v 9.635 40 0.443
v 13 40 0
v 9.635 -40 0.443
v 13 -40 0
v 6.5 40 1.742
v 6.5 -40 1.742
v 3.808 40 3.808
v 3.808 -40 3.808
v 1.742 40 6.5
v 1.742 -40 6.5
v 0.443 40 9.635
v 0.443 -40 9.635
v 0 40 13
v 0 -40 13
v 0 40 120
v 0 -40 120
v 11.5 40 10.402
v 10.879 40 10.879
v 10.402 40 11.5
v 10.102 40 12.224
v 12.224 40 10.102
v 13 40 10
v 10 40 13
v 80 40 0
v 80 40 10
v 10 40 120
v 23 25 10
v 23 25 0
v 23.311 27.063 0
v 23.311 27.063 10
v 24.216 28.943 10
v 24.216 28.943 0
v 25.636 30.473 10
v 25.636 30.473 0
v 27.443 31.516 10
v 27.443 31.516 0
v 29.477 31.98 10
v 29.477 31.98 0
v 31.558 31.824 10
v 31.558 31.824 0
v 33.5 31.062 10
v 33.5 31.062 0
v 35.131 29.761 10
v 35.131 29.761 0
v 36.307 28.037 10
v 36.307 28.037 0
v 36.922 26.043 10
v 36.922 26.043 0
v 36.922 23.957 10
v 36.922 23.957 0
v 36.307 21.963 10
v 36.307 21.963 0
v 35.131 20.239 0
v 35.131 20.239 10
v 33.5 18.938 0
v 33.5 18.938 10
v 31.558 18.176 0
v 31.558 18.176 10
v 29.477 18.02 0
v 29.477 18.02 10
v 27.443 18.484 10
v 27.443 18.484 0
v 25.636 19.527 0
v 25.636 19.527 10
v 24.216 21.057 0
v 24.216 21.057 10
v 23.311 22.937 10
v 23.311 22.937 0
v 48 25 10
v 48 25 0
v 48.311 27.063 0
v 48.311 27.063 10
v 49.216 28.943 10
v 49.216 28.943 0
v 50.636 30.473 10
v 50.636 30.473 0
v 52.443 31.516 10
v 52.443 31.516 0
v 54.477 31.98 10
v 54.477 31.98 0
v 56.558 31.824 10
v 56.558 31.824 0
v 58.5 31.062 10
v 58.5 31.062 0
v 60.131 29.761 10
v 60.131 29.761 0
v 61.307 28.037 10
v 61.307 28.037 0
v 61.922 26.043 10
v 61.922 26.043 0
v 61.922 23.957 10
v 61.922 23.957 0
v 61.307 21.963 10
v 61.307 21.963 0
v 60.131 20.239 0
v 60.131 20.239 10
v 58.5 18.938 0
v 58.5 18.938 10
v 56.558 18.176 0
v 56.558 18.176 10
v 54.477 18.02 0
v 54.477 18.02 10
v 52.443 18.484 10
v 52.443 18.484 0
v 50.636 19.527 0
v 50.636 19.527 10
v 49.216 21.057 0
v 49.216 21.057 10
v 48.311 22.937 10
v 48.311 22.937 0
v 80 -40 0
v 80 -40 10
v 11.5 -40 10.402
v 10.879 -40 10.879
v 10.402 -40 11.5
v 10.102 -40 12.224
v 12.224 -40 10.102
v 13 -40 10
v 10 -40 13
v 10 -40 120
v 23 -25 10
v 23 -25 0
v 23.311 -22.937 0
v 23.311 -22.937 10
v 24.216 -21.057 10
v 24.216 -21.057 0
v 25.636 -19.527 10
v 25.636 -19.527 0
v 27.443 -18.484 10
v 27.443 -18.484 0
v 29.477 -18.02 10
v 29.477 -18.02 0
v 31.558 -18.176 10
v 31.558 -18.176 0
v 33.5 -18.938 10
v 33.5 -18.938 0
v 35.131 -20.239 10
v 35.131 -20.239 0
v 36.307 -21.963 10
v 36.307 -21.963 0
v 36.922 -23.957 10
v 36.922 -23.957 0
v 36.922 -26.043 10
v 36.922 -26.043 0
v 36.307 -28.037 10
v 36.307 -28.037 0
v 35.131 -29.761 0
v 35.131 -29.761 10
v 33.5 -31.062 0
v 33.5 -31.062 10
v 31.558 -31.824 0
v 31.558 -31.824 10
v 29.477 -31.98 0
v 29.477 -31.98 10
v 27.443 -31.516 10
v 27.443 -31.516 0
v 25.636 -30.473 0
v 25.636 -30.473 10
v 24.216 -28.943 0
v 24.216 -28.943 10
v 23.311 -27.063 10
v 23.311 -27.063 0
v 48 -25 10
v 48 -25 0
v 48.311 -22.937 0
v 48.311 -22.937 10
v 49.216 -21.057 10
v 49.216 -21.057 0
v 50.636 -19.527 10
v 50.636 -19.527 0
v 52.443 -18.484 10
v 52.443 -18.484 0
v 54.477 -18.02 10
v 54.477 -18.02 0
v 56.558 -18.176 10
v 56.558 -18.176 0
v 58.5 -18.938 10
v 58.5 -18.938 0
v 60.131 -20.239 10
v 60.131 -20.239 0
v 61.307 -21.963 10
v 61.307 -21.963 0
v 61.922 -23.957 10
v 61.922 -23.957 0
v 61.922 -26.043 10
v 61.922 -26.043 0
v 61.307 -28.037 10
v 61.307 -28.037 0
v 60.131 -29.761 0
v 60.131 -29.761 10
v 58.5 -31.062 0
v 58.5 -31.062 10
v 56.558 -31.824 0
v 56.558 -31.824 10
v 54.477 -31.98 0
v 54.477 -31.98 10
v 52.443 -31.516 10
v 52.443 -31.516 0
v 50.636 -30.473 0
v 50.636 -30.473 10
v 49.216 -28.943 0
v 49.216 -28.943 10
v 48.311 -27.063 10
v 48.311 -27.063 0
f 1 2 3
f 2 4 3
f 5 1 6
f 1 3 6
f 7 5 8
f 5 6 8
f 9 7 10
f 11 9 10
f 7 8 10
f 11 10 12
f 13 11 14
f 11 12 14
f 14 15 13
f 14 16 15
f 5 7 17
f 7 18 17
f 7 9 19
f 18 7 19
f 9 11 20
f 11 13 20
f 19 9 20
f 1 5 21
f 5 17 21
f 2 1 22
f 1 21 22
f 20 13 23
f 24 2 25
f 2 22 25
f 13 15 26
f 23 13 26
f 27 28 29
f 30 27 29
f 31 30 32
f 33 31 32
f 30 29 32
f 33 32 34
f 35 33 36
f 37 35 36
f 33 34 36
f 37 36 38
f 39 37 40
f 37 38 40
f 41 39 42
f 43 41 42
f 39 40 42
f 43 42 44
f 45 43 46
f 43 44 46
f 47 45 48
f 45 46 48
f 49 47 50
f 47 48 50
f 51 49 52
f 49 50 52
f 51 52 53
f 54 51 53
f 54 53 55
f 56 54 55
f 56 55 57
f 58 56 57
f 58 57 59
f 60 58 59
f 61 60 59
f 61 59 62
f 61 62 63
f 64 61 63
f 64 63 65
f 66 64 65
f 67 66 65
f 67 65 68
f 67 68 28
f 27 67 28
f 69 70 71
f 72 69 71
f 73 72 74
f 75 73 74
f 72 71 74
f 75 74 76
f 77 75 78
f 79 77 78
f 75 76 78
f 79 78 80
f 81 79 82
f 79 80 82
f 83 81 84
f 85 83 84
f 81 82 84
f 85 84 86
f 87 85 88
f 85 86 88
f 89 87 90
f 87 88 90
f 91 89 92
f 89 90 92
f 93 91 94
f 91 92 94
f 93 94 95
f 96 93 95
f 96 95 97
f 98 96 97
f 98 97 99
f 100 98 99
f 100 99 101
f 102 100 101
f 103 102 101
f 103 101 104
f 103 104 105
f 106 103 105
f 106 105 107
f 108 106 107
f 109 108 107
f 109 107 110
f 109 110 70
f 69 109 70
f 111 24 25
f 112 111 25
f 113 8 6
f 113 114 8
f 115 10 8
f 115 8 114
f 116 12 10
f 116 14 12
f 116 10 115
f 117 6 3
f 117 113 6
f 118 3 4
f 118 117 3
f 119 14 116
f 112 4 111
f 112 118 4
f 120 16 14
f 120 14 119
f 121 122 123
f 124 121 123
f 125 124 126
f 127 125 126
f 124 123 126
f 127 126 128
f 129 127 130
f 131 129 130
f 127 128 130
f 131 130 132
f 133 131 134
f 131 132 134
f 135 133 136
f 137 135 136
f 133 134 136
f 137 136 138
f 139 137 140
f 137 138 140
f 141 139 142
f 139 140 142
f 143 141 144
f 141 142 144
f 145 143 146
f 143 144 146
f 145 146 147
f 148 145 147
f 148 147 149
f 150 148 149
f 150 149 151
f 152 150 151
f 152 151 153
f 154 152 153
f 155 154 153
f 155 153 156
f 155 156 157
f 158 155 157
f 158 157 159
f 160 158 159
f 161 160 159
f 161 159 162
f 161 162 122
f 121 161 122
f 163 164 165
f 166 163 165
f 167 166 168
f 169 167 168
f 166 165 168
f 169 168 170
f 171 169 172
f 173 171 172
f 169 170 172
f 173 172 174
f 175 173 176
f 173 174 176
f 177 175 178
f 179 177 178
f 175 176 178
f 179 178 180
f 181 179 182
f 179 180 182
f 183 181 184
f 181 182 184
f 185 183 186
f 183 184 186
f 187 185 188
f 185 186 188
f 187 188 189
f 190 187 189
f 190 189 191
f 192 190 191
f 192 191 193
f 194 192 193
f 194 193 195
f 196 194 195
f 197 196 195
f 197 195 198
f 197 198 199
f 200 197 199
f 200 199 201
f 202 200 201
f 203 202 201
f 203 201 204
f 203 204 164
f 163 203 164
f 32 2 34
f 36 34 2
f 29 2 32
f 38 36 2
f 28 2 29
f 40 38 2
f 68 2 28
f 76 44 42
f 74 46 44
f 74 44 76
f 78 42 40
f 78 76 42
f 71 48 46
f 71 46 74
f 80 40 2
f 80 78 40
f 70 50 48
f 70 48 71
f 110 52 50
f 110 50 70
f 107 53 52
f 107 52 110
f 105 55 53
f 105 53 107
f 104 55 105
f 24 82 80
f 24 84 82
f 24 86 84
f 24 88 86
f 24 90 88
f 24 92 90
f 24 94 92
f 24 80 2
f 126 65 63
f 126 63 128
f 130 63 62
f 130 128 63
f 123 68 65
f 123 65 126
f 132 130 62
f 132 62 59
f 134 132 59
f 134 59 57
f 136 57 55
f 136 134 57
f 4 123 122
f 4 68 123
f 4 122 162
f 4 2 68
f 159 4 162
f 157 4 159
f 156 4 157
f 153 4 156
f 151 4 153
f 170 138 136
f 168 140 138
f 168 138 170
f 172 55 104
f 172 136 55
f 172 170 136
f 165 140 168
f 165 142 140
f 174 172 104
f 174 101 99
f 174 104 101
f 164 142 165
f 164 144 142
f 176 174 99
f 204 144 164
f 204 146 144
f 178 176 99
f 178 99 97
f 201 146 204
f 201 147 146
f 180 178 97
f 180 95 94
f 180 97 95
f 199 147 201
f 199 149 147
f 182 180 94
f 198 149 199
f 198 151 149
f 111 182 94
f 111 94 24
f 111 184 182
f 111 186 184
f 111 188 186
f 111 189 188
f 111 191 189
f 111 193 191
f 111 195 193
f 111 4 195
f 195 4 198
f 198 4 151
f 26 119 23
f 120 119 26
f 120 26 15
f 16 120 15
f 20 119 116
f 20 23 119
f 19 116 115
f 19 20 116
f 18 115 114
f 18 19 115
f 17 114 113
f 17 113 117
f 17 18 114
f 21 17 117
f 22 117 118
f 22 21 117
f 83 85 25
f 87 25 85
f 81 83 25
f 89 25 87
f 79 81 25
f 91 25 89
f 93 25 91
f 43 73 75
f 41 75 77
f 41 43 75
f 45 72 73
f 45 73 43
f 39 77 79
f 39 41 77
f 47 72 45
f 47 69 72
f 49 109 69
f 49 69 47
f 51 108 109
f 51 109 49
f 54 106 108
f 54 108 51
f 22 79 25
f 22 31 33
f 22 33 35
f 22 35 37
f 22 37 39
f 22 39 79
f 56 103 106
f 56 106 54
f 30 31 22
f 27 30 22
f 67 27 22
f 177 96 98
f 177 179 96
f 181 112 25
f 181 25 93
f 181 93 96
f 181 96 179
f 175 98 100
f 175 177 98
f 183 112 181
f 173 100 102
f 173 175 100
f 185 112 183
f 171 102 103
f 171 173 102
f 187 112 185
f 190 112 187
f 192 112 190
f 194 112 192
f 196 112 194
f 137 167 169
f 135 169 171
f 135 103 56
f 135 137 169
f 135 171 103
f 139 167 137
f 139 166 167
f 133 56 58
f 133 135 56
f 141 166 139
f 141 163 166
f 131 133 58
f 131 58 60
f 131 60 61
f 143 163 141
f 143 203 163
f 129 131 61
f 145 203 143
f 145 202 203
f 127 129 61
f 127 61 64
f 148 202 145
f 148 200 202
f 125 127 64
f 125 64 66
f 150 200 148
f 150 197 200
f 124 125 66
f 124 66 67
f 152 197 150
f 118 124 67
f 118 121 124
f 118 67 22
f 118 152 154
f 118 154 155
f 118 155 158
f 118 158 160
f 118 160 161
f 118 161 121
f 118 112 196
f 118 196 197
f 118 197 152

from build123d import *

# Parameters (mm, degrees)
F1_DEPTH = 40
F2_R     = 3
F3_R     = 13
F5_D     = 14


with BuildPart() as f1:
    # F0 (on Front) → F1 (new body, symmetric)
    with BuildSketch(Plane.XZ):
        Polygon((10, 120), (0, 120), (0, 0), (80, 0), (80, 10), (10, 10), align=None)
    extrude(amount=F1_DEPTH, both=True)

    # F2
    f2_edges = [f1.edges().sort_by_distance(p)[0] for p in [
        (10, 0, 10),
    ]]
    fillet(f2_edges, radius=F2_R)

    # F3
    f3_edges = [f1.edges().sort_by_distance(p)[0] for p in [
        (0, 0, 0),
    ]]
    fillet(f3_edges, radius=F3_R)

    # F5 (through all)
    with Locations(Plane.XY.offset(10)):
        with Locations((55, 25), (55, -25), (30, -25), (30, 25)):
            Hole(F5_D / 2)


solid = f1.part
